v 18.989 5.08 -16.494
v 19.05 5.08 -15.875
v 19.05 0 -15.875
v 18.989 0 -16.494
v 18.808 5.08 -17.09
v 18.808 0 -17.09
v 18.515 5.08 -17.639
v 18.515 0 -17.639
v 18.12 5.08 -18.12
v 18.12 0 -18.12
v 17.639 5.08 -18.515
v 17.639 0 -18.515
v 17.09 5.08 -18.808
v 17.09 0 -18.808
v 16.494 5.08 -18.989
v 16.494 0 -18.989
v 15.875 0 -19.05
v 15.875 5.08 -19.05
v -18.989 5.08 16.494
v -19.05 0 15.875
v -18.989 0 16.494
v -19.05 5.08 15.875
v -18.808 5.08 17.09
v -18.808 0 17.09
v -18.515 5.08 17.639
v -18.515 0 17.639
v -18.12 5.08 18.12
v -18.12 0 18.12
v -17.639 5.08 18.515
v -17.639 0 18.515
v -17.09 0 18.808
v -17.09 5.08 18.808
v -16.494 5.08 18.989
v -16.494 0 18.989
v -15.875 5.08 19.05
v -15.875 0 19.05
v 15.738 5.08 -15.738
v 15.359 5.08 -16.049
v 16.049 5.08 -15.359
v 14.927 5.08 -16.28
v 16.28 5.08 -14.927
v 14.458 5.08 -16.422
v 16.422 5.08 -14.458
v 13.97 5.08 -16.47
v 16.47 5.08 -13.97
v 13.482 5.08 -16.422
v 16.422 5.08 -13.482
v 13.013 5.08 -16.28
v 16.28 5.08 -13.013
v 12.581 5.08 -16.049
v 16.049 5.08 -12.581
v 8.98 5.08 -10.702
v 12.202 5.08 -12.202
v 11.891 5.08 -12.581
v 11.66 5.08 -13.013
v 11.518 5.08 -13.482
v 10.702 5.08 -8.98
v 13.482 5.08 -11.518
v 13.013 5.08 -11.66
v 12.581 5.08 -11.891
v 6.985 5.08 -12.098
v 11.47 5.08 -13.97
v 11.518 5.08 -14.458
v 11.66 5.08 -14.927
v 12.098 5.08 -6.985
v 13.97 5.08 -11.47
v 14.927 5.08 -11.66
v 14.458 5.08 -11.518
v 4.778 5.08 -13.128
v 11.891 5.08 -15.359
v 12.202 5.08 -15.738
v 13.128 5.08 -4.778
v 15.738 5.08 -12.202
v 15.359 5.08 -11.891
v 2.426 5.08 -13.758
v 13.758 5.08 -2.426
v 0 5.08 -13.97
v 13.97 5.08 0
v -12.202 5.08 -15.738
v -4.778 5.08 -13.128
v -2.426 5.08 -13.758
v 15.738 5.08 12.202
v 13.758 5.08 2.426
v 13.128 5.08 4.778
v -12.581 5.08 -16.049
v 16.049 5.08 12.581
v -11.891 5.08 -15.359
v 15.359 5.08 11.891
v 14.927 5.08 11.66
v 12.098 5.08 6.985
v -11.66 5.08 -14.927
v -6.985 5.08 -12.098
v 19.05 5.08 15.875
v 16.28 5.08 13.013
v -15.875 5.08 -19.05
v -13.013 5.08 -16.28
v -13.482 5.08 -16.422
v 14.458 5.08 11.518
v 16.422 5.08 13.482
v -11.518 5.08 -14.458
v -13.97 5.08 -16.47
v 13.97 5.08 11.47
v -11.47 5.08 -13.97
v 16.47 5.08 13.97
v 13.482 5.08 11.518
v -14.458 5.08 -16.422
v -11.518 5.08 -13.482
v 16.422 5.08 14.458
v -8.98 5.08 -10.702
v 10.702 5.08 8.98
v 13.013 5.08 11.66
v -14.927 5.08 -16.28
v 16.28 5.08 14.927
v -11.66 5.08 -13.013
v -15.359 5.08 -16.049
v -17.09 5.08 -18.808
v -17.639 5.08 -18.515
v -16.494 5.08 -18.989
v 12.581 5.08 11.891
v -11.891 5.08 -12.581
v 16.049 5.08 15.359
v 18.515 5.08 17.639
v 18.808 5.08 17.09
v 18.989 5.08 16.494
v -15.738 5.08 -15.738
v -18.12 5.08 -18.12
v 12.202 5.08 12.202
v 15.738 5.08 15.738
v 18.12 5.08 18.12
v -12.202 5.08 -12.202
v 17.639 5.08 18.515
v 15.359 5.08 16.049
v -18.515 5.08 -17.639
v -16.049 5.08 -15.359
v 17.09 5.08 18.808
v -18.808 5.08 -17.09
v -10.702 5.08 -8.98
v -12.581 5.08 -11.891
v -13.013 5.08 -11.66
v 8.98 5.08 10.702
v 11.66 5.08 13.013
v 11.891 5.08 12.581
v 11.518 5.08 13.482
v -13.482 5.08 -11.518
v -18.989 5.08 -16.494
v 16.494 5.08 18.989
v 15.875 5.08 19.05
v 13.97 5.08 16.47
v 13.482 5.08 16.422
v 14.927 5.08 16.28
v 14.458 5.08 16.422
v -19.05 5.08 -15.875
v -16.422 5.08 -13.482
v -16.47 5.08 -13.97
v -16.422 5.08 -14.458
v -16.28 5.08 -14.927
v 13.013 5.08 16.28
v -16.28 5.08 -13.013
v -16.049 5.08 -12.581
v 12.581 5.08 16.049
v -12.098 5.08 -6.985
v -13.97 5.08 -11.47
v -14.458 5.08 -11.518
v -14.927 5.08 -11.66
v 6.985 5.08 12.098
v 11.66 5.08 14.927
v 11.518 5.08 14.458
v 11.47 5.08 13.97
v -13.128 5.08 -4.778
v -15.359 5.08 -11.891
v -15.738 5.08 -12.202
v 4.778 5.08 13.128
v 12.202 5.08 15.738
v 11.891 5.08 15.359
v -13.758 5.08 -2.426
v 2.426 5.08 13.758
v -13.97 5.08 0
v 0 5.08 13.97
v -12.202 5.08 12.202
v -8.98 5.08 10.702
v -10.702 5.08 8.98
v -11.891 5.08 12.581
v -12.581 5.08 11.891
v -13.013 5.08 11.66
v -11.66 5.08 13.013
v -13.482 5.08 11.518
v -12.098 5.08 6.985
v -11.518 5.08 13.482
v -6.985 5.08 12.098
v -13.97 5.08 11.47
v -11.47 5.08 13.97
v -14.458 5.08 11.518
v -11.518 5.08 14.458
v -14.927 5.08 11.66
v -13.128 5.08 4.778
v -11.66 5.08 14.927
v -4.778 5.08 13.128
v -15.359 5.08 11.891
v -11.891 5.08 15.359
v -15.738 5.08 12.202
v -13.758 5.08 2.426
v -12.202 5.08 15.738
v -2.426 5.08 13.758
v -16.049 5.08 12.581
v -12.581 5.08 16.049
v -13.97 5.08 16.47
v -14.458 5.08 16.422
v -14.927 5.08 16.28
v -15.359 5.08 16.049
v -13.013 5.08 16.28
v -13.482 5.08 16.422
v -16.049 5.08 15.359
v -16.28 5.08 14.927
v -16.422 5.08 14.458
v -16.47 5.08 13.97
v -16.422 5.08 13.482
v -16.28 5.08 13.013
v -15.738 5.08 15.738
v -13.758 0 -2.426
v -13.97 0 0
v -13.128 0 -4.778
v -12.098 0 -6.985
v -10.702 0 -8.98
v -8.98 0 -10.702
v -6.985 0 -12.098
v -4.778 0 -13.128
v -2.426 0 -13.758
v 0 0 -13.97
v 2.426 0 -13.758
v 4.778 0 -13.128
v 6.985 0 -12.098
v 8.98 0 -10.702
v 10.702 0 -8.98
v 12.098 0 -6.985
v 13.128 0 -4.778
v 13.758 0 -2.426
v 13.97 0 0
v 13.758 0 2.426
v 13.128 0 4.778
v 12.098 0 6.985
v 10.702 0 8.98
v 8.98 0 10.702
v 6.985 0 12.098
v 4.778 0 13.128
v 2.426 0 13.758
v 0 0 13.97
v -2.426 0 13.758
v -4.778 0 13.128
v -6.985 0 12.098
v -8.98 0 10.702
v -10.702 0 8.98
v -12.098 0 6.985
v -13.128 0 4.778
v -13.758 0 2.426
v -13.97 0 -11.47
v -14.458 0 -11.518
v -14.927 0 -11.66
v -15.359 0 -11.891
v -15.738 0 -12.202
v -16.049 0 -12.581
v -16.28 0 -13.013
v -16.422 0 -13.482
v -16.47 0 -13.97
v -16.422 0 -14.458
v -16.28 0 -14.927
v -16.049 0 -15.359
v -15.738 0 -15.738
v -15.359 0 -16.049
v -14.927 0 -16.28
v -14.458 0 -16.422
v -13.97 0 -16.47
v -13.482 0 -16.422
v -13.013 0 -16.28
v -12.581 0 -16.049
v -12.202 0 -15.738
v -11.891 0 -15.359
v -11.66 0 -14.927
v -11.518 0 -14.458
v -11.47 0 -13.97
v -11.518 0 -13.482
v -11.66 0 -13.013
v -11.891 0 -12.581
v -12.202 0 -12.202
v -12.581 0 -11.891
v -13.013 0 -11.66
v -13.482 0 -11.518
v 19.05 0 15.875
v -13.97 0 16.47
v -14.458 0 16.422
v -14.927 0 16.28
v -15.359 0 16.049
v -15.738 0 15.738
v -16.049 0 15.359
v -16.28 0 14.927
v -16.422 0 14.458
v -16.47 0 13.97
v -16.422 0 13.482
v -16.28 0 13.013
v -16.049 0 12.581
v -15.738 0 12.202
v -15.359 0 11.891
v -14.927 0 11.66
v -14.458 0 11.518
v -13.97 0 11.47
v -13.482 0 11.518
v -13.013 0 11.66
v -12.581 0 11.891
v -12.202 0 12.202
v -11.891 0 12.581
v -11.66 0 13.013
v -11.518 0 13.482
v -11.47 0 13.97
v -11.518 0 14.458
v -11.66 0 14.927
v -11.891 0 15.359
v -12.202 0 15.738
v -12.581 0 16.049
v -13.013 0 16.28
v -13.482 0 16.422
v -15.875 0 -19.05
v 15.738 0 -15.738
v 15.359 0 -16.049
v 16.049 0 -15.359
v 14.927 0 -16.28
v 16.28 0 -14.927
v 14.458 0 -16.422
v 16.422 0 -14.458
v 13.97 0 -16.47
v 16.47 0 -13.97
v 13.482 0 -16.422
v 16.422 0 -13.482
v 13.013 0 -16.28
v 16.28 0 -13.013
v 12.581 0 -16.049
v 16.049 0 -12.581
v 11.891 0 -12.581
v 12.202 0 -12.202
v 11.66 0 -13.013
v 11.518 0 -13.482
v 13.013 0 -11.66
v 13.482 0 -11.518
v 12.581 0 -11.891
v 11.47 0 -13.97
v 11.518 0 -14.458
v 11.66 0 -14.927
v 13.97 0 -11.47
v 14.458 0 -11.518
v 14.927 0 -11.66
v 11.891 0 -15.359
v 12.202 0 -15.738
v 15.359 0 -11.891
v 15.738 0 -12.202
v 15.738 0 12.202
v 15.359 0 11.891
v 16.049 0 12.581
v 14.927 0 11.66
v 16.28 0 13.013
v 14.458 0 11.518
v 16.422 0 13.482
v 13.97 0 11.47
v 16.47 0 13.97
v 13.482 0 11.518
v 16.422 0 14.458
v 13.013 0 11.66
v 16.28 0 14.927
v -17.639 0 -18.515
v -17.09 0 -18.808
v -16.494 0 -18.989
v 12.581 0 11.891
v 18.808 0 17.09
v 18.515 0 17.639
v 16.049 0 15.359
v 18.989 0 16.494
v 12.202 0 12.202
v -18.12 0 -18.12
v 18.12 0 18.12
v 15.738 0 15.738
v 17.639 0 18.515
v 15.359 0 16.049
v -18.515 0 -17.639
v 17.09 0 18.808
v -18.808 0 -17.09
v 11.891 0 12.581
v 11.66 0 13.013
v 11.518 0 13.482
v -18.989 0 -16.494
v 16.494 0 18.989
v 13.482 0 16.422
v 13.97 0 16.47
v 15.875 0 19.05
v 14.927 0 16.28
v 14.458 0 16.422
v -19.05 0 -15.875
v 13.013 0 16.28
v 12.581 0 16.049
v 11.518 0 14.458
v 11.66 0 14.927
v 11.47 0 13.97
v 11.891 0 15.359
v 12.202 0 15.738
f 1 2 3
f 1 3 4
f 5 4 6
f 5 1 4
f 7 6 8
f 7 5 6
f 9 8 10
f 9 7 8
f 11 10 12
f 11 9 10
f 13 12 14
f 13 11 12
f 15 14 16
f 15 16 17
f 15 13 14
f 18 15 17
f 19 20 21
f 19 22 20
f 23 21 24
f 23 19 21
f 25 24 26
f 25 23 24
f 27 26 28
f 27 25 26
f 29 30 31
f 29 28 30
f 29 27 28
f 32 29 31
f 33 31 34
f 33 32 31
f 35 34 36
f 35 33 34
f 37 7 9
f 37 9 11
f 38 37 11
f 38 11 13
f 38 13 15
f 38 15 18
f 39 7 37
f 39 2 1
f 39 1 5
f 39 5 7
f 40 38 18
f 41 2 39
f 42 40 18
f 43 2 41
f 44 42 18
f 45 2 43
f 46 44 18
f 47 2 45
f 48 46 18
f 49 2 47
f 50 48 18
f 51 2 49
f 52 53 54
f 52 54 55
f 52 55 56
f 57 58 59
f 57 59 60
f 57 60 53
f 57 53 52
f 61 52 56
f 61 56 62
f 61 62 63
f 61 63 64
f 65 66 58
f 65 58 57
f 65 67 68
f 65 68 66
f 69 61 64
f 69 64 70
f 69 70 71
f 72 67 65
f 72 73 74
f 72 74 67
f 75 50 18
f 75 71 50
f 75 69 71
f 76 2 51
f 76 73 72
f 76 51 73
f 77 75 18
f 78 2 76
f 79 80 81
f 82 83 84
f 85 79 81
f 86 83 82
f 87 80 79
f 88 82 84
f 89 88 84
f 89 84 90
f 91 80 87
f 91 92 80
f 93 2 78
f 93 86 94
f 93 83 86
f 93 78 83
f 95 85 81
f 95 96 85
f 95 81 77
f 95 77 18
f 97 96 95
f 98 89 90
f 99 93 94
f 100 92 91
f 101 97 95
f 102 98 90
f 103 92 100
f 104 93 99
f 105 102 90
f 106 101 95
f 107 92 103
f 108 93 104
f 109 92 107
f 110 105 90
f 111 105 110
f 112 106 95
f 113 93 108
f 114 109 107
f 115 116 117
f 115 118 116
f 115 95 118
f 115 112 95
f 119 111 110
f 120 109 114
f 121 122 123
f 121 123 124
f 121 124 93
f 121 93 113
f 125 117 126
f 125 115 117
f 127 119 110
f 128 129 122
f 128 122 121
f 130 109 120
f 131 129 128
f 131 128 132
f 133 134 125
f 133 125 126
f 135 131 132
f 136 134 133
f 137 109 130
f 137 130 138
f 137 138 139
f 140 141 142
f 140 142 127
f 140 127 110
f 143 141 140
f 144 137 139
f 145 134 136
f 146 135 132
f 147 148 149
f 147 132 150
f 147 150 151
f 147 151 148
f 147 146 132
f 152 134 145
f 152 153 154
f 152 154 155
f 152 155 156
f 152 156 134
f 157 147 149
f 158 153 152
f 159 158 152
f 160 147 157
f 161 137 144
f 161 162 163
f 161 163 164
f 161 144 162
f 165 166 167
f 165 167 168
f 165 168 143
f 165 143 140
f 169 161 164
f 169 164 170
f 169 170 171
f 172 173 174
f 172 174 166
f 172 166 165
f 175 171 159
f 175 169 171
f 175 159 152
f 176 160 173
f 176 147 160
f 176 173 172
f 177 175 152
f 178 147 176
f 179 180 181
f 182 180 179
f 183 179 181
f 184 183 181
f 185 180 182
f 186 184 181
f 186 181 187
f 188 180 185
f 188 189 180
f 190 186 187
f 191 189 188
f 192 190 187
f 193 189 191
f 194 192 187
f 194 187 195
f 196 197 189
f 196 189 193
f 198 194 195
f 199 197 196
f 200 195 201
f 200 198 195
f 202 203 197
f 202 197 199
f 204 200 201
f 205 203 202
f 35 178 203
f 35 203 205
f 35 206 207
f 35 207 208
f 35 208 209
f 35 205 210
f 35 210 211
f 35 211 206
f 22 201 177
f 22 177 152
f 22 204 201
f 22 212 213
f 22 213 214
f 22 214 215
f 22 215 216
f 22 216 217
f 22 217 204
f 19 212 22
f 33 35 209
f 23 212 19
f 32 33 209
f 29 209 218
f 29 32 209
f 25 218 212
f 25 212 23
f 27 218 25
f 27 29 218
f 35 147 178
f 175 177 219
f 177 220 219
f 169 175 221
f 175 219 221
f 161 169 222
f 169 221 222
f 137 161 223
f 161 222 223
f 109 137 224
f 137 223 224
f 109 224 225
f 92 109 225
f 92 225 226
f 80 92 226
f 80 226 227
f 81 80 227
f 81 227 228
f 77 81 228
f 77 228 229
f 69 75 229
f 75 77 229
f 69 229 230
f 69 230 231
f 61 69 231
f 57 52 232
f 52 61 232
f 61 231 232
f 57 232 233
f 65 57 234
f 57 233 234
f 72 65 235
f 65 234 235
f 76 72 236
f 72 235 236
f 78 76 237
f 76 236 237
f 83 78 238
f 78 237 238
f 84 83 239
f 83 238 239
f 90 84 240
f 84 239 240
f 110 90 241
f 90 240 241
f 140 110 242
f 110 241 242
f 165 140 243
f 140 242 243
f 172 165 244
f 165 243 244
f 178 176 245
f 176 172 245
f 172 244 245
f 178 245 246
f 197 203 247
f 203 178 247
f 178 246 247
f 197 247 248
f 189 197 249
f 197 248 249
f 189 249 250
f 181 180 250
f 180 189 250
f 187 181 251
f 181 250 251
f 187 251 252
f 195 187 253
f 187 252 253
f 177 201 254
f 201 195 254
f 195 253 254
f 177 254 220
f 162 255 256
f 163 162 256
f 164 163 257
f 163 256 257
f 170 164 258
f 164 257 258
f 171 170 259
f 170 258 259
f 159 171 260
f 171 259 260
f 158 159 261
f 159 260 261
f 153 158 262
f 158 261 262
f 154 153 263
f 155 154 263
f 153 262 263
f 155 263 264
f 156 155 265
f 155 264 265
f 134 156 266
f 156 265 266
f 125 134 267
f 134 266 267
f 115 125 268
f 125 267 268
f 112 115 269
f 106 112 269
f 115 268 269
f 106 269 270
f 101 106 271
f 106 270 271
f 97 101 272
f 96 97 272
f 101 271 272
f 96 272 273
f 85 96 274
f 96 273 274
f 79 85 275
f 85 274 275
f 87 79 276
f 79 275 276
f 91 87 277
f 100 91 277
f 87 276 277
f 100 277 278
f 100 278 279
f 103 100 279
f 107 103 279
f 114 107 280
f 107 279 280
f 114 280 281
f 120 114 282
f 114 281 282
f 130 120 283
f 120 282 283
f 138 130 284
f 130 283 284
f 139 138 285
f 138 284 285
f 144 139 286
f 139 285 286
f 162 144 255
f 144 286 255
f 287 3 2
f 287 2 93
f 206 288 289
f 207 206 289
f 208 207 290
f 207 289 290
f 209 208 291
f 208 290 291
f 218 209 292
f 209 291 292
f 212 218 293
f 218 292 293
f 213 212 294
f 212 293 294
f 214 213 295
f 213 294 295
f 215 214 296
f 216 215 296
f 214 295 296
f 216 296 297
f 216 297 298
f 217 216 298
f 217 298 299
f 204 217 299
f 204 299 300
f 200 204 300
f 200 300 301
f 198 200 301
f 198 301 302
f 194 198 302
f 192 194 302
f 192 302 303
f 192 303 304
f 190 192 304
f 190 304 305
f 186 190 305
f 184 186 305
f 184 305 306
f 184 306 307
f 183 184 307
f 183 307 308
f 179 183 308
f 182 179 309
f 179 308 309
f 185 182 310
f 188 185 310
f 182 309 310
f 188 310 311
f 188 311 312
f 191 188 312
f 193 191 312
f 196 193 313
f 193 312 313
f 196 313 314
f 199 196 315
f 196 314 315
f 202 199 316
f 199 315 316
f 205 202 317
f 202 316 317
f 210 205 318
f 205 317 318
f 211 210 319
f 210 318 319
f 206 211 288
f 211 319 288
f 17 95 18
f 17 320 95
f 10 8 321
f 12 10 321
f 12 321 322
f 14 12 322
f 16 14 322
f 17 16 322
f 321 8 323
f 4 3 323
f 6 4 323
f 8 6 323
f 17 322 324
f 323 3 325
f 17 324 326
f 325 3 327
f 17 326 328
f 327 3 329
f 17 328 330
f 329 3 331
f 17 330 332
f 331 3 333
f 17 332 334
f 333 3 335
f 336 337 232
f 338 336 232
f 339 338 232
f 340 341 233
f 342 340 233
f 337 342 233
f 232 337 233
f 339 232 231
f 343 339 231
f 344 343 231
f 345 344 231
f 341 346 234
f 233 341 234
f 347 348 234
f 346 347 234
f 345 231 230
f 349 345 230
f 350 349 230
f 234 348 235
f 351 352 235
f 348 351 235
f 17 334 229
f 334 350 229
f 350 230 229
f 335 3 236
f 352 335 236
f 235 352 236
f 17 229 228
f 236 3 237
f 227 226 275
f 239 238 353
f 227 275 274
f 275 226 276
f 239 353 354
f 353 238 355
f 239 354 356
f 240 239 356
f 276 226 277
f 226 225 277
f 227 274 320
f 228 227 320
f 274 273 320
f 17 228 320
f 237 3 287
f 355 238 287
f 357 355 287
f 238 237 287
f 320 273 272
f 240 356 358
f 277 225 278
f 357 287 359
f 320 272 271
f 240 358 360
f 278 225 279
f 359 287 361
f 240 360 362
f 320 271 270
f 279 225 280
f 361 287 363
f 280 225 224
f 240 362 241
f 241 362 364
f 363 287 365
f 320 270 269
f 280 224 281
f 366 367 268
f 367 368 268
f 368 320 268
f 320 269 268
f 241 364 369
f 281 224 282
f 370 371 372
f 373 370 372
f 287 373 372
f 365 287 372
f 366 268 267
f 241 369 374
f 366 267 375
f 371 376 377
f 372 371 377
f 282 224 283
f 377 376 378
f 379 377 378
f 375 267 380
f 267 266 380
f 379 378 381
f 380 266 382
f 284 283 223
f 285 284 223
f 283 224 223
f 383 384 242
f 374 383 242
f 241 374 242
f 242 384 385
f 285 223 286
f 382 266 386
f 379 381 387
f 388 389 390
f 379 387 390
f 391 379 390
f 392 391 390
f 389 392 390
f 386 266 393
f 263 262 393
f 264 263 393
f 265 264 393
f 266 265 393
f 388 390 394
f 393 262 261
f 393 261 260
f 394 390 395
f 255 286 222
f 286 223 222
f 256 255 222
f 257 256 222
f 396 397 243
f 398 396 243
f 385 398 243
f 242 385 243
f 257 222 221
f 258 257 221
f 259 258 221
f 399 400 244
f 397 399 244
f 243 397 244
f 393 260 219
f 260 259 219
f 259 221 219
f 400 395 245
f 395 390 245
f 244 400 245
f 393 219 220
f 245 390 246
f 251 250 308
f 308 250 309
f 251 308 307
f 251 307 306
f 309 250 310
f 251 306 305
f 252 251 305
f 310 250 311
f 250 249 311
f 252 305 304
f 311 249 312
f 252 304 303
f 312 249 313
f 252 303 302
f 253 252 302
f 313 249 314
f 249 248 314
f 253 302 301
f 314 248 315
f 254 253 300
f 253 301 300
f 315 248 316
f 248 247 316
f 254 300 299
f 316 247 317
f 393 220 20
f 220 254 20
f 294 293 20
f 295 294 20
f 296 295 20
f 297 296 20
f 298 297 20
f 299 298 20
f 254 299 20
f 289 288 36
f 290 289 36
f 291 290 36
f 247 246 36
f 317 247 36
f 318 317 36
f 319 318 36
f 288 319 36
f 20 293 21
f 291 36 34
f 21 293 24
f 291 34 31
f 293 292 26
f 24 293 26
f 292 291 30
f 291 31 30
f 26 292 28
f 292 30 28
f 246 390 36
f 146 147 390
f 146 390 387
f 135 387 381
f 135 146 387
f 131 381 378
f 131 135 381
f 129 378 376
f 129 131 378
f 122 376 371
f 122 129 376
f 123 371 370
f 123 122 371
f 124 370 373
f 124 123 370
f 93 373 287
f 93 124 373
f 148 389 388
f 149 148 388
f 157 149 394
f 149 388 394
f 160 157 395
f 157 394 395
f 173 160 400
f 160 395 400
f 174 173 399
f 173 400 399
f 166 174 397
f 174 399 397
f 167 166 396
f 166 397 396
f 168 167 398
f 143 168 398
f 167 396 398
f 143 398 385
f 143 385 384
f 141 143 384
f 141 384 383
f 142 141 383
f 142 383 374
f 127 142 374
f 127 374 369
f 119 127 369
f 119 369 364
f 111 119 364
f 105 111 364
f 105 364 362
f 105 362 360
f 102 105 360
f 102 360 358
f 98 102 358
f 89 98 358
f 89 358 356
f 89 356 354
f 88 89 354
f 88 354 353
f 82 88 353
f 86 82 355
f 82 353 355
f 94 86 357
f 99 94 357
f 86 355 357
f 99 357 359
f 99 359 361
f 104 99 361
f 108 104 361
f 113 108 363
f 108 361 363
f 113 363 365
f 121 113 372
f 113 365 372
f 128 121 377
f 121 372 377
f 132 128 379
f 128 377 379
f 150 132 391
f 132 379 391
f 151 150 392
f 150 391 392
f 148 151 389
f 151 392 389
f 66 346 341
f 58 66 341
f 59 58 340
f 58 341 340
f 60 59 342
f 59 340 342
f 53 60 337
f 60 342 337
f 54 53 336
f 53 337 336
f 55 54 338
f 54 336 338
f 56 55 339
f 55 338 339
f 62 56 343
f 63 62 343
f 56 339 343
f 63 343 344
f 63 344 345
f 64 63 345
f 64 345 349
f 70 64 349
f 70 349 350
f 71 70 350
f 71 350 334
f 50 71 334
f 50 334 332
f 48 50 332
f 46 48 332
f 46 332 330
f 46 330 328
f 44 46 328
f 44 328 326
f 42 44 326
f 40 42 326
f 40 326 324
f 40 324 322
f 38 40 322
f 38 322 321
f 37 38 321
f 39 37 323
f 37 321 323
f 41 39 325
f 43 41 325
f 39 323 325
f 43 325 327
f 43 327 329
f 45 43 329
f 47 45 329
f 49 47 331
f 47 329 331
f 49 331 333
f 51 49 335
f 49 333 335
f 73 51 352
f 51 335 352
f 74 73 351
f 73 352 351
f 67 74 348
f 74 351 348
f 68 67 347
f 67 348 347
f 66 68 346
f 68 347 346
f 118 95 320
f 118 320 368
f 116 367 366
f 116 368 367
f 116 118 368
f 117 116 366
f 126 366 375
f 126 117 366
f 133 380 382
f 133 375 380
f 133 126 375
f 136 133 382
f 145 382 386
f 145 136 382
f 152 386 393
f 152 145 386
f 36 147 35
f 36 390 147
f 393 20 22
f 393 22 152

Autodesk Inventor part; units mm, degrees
ref_plane "YZ Plane" through (0, 0, 0) normal (1, 0, 0) x (0, 1, 0)
ref_plane "XZ Plane" through (0, 0, 0) normal (0, 1, 0) x (-1, 0, 0)
ref_plane "XY Plane" through (0, 0, 0) normal (0, 0, 1) x (1, 0, 0)
sketch "Sketch1" plane through (0, 0, 0) normal (0, 1, 0) x (-1, 0, 0)
  circle A0 centre (0, 0) radius 13.97
  line L0 (-19.05, 19.05) -> (19.05, 19.05)
  line L1 (19.05, 19.05) -> (19.05, -19.05)
  line L2 (19.05, -19.05) -> (-19.05, -19.05)
  line L3 (-19.05, -19.05) -> (-19.05, 19.05)
  line L4 (-19.05, 19.05) -> (19.05, -19.05) construction
  line L5 (19.05, 19.05) -> (-19.05, -19.05) construction
  dimension "d0" = 27.94
  dimension "d1" = 38.1
  dimension "d2" = 38.1
extrude "Extrusion1" add sketch "Sketch1" along normal blind 5.08
sketch "Sketch2" plane through (0, 5.08, 0) normal (0, 1, 0) x (1, 0, 0)
  circle A0 centre (0, 0) radius 13.97 construction
  line L0 (-19.05, -19.05) -> (-19.05, 19.05) construction
  line L1 (-19.05, 19.05) -> (19.05, 19.05) construction
  line L2 (19.05, 19.05) -> (19.05, -19.05) construction
  line L3 (19.05, -19.05) -> (-19.05, -19.05) construction
  line L4 (-19.05, -19.05) -> (0, 0) construction
  point P0 (-13.97, -13.97)
  point P1 (13.97, -13.97)
  point P2 (13.97, 13.97)
  point P3 (-13.97, 13.97)
  dimension "d5" = 13.97
  dimension "d8" = 360
hole "Hole1" at (-13.97, 5.08, 13.97) at (13.97, 5.08, 13.97) at (13.97, 5.08, -13.97) at (-13.97, 5.08, -13.97) direction (0, -1, 0) diameter 5 end through all
fillet "Fillet1" radius 3.175 4 edges at (-19.05, 2.54, 19.05) (-19.05, 2.54, -19.05) (19.05, 2.54, -19.05) (19.05, 2.54, 19.05)
equation "\"d2\" = d1"
properties part number "BearingMount" material "Wood (Birch)"
